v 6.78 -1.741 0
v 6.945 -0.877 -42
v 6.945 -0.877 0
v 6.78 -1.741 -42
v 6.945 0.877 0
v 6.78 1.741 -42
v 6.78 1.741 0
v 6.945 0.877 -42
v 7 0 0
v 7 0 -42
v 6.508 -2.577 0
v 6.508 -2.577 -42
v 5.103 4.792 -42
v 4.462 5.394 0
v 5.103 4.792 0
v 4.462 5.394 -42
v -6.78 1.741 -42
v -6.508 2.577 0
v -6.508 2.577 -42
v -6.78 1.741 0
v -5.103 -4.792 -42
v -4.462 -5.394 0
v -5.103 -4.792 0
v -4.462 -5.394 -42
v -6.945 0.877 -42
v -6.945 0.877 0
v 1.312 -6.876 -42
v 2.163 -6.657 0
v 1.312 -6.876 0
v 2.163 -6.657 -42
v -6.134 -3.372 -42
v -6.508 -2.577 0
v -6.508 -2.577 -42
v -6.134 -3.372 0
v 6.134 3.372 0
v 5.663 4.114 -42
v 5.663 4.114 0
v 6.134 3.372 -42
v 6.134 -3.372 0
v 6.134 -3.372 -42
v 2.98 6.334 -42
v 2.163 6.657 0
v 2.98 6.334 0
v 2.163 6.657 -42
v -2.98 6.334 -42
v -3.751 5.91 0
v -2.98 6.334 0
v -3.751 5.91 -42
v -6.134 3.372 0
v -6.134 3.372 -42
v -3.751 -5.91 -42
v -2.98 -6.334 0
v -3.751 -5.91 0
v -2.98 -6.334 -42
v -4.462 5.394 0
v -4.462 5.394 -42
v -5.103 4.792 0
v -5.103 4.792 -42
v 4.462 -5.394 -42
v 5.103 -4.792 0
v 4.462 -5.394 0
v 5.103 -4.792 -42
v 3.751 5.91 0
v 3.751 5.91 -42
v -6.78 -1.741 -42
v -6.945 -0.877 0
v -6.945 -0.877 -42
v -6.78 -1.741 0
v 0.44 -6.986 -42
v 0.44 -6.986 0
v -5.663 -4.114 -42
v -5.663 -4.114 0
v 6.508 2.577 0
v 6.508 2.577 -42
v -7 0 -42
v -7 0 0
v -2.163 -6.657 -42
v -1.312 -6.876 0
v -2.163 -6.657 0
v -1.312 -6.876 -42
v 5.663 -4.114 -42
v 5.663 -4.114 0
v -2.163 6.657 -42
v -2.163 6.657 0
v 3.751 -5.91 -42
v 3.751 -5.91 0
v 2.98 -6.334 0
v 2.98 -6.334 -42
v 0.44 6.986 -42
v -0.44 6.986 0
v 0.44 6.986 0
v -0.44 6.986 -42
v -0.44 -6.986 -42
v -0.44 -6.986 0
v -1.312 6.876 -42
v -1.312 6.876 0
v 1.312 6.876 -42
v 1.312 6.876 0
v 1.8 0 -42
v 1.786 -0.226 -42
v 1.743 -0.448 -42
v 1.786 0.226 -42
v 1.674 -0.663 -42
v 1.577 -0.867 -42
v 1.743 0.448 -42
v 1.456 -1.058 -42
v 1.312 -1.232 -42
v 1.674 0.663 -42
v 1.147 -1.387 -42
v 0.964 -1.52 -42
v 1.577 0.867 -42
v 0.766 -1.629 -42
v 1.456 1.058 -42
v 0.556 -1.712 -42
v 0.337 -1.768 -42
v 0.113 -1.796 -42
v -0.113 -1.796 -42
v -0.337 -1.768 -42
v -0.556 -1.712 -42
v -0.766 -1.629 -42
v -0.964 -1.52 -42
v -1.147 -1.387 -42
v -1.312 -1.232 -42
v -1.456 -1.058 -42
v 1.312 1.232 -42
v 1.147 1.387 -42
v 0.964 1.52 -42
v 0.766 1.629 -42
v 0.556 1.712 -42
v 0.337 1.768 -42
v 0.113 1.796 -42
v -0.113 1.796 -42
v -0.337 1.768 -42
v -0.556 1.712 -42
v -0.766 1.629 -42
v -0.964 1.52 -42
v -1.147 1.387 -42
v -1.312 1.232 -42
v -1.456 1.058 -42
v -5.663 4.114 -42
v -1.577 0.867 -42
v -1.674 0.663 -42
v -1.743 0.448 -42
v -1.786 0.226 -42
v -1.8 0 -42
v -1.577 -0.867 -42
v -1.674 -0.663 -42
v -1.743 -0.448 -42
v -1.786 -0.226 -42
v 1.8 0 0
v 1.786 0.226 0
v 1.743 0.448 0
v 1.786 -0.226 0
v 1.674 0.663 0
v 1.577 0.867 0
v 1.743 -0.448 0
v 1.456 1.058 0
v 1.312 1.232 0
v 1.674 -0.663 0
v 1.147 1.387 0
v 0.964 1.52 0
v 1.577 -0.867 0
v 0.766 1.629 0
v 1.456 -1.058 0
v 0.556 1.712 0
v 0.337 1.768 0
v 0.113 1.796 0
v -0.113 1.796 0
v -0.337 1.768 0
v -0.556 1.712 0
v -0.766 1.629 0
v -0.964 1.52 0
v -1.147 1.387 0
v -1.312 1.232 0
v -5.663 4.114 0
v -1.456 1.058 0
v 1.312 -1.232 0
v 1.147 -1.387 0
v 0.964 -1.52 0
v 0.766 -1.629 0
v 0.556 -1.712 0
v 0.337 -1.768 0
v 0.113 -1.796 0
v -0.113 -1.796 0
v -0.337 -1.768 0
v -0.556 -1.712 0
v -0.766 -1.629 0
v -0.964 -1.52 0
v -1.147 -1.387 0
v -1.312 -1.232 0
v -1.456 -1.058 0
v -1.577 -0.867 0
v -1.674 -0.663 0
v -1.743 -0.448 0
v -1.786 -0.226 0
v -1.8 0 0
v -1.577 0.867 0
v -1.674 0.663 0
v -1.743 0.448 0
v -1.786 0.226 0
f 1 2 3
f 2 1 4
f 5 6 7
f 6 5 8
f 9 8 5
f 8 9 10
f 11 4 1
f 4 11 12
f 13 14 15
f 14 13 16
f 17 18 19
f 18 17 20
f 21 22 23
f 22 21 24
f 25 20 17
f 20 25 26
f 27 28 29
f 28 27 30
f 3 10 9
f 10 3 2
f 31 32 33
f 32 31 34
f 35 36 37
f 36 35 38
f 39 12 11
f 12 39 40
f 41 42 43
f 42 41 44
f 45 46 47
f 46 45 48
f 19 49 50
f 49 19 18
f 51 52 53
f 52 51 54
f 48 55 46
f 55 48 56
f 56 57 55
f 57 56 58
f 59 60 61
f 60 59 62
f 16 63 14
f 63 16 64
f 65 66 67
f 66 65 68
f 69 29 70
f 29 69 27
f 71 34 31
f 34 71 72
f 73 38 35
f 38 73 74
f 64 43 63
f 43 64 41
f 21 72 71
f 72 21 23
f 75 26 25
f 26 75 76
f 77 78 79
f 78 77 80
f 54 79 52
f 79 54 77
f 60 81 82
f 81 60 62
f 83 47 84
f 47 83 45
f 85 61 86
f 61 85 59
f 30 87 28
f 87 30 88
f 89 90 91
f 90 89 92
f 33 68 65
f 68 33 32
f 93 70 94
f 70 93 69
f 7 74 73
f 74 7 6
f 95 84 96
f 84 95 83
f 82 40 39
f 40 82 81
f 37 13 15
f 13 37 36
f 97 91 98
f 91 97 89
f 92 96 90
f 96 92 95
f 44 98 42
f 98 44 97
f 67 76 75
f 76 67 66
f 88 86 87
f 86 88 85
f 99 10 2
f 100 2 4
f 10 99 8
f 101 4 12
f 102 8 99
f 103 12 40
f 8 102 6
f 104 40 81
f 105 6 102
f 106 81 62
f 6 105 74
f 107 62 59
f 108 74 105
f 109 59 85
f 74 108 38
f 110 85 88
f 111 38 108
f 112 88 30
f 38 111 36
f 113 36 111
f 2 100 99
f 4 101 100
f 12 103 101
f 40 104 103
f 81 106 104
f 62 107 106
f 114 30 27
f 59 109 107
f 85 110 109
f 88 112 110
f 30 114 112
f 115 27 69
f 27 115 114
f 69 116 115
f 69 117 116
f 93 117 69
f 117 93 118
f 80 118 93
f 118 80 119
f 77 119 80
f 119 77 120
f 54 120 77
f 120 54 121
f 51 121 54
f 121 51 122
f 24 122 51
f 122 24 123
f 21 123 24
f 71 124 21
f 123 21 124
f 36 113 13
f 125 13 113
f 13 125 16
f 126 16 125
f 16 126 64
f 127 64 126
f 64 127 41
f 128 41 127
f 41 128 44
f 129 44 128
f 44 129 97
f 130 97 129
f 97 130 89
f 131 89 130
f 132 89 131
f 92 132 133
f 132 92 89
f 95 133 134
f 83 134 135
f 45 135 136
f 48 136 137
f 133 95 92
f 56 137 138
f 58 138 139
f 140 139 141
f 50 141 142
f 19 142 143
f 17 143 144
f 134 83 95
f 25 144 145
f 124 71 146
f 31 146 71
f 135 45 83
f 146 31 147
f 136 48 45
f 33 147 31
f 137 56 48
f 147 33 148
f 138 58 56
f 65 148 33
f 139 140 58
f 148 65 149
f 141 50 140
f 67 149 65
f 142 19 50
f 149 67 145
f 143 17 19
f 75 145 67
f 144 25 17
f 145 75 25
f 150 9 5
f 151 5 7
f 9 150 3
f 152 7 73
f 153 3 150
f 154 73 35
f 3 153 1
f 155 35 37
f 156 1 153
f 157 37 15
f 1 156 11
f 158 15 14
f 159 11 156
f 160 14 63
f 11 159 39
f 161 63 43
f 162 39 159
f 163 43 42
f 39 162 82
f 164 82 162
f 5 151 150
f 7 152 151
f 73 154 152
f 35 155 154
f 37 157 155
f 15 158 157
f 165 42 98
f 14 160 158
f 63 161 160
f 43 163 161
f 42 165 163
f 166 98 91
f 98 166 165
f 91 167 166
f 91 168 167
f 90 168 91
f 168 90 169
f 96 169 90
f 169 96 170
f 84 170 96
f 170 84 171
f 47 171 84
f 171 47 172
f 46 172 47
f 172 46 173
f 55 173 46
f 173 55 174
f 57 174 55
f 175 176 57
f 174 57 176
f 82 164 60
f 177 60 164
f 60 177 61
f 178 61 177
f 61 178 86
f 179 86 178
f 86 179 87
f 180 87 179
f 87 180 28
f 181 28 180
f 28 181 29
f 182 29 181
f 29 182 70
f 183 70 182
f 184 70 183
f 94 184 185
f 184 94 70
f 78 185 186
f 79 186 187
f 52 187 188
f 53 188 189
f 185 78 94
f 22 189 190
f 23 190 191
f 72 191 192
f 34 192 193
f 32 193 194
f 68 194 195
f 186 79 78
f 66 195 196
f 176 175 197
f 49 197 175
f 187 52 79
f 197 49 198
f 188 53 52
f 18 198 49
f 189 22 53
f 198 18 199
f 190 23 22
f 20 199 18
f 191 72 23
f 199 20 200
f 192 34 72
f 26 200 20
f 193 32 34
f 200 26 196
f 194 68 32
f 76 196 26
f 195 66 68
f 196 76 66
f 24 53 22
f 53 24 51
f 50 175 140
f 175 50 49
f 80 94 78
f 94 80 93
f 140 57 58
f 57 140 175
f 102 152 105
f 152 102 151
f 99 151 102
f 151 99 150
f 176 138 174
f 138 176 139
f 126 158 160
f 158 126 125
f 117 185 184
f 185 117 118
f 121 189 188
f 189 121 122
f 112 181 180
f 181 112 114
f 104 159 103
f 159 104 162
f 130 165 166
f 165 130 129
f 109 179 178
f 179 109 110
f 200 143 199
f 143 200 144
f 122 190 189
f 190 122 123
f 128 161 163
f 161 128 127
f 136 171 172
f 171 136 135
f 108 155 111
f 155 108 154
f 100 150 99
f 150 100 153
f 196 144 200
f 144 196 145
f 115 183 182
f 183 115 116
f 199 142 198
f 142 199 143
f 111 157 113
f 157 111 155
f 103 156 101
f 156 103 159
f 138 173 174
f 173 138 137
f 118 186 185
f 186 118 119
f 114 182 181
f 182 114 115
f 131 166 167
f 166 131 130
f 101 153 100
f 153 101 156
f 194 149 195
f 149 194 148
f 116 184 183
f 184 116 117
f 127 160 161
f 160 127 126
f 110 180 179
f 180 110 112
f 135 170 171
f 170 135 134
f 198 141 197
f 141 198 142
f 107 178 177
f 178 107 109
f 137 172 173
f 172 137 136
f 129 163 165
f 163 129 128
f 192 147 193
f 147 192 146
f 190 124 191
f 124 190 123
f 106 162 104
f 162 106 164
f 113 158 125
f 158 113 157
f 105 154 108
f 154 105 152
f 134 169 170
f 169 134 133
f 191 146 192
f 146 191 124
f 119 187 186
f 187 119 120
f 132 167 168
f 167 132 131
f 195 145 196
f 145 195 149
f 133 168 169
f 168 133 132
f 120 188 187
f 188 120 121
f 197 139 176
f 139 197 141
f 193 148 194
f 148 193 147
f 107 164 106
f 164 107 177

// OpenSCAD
$fn = 50;


difference() {
	union() {
		translate(v = [0, 0, -42.0000000000]) {
			cylinder(h = 42, r = 7.0000000000);
		}
		cylinder(h = 0, r = 16.0000000000);
	}
	union() {
		#translate(v = [0, 0, -42]) {
			cylinder(h = 42, r = 1.8000000000);
		}
	}
}
